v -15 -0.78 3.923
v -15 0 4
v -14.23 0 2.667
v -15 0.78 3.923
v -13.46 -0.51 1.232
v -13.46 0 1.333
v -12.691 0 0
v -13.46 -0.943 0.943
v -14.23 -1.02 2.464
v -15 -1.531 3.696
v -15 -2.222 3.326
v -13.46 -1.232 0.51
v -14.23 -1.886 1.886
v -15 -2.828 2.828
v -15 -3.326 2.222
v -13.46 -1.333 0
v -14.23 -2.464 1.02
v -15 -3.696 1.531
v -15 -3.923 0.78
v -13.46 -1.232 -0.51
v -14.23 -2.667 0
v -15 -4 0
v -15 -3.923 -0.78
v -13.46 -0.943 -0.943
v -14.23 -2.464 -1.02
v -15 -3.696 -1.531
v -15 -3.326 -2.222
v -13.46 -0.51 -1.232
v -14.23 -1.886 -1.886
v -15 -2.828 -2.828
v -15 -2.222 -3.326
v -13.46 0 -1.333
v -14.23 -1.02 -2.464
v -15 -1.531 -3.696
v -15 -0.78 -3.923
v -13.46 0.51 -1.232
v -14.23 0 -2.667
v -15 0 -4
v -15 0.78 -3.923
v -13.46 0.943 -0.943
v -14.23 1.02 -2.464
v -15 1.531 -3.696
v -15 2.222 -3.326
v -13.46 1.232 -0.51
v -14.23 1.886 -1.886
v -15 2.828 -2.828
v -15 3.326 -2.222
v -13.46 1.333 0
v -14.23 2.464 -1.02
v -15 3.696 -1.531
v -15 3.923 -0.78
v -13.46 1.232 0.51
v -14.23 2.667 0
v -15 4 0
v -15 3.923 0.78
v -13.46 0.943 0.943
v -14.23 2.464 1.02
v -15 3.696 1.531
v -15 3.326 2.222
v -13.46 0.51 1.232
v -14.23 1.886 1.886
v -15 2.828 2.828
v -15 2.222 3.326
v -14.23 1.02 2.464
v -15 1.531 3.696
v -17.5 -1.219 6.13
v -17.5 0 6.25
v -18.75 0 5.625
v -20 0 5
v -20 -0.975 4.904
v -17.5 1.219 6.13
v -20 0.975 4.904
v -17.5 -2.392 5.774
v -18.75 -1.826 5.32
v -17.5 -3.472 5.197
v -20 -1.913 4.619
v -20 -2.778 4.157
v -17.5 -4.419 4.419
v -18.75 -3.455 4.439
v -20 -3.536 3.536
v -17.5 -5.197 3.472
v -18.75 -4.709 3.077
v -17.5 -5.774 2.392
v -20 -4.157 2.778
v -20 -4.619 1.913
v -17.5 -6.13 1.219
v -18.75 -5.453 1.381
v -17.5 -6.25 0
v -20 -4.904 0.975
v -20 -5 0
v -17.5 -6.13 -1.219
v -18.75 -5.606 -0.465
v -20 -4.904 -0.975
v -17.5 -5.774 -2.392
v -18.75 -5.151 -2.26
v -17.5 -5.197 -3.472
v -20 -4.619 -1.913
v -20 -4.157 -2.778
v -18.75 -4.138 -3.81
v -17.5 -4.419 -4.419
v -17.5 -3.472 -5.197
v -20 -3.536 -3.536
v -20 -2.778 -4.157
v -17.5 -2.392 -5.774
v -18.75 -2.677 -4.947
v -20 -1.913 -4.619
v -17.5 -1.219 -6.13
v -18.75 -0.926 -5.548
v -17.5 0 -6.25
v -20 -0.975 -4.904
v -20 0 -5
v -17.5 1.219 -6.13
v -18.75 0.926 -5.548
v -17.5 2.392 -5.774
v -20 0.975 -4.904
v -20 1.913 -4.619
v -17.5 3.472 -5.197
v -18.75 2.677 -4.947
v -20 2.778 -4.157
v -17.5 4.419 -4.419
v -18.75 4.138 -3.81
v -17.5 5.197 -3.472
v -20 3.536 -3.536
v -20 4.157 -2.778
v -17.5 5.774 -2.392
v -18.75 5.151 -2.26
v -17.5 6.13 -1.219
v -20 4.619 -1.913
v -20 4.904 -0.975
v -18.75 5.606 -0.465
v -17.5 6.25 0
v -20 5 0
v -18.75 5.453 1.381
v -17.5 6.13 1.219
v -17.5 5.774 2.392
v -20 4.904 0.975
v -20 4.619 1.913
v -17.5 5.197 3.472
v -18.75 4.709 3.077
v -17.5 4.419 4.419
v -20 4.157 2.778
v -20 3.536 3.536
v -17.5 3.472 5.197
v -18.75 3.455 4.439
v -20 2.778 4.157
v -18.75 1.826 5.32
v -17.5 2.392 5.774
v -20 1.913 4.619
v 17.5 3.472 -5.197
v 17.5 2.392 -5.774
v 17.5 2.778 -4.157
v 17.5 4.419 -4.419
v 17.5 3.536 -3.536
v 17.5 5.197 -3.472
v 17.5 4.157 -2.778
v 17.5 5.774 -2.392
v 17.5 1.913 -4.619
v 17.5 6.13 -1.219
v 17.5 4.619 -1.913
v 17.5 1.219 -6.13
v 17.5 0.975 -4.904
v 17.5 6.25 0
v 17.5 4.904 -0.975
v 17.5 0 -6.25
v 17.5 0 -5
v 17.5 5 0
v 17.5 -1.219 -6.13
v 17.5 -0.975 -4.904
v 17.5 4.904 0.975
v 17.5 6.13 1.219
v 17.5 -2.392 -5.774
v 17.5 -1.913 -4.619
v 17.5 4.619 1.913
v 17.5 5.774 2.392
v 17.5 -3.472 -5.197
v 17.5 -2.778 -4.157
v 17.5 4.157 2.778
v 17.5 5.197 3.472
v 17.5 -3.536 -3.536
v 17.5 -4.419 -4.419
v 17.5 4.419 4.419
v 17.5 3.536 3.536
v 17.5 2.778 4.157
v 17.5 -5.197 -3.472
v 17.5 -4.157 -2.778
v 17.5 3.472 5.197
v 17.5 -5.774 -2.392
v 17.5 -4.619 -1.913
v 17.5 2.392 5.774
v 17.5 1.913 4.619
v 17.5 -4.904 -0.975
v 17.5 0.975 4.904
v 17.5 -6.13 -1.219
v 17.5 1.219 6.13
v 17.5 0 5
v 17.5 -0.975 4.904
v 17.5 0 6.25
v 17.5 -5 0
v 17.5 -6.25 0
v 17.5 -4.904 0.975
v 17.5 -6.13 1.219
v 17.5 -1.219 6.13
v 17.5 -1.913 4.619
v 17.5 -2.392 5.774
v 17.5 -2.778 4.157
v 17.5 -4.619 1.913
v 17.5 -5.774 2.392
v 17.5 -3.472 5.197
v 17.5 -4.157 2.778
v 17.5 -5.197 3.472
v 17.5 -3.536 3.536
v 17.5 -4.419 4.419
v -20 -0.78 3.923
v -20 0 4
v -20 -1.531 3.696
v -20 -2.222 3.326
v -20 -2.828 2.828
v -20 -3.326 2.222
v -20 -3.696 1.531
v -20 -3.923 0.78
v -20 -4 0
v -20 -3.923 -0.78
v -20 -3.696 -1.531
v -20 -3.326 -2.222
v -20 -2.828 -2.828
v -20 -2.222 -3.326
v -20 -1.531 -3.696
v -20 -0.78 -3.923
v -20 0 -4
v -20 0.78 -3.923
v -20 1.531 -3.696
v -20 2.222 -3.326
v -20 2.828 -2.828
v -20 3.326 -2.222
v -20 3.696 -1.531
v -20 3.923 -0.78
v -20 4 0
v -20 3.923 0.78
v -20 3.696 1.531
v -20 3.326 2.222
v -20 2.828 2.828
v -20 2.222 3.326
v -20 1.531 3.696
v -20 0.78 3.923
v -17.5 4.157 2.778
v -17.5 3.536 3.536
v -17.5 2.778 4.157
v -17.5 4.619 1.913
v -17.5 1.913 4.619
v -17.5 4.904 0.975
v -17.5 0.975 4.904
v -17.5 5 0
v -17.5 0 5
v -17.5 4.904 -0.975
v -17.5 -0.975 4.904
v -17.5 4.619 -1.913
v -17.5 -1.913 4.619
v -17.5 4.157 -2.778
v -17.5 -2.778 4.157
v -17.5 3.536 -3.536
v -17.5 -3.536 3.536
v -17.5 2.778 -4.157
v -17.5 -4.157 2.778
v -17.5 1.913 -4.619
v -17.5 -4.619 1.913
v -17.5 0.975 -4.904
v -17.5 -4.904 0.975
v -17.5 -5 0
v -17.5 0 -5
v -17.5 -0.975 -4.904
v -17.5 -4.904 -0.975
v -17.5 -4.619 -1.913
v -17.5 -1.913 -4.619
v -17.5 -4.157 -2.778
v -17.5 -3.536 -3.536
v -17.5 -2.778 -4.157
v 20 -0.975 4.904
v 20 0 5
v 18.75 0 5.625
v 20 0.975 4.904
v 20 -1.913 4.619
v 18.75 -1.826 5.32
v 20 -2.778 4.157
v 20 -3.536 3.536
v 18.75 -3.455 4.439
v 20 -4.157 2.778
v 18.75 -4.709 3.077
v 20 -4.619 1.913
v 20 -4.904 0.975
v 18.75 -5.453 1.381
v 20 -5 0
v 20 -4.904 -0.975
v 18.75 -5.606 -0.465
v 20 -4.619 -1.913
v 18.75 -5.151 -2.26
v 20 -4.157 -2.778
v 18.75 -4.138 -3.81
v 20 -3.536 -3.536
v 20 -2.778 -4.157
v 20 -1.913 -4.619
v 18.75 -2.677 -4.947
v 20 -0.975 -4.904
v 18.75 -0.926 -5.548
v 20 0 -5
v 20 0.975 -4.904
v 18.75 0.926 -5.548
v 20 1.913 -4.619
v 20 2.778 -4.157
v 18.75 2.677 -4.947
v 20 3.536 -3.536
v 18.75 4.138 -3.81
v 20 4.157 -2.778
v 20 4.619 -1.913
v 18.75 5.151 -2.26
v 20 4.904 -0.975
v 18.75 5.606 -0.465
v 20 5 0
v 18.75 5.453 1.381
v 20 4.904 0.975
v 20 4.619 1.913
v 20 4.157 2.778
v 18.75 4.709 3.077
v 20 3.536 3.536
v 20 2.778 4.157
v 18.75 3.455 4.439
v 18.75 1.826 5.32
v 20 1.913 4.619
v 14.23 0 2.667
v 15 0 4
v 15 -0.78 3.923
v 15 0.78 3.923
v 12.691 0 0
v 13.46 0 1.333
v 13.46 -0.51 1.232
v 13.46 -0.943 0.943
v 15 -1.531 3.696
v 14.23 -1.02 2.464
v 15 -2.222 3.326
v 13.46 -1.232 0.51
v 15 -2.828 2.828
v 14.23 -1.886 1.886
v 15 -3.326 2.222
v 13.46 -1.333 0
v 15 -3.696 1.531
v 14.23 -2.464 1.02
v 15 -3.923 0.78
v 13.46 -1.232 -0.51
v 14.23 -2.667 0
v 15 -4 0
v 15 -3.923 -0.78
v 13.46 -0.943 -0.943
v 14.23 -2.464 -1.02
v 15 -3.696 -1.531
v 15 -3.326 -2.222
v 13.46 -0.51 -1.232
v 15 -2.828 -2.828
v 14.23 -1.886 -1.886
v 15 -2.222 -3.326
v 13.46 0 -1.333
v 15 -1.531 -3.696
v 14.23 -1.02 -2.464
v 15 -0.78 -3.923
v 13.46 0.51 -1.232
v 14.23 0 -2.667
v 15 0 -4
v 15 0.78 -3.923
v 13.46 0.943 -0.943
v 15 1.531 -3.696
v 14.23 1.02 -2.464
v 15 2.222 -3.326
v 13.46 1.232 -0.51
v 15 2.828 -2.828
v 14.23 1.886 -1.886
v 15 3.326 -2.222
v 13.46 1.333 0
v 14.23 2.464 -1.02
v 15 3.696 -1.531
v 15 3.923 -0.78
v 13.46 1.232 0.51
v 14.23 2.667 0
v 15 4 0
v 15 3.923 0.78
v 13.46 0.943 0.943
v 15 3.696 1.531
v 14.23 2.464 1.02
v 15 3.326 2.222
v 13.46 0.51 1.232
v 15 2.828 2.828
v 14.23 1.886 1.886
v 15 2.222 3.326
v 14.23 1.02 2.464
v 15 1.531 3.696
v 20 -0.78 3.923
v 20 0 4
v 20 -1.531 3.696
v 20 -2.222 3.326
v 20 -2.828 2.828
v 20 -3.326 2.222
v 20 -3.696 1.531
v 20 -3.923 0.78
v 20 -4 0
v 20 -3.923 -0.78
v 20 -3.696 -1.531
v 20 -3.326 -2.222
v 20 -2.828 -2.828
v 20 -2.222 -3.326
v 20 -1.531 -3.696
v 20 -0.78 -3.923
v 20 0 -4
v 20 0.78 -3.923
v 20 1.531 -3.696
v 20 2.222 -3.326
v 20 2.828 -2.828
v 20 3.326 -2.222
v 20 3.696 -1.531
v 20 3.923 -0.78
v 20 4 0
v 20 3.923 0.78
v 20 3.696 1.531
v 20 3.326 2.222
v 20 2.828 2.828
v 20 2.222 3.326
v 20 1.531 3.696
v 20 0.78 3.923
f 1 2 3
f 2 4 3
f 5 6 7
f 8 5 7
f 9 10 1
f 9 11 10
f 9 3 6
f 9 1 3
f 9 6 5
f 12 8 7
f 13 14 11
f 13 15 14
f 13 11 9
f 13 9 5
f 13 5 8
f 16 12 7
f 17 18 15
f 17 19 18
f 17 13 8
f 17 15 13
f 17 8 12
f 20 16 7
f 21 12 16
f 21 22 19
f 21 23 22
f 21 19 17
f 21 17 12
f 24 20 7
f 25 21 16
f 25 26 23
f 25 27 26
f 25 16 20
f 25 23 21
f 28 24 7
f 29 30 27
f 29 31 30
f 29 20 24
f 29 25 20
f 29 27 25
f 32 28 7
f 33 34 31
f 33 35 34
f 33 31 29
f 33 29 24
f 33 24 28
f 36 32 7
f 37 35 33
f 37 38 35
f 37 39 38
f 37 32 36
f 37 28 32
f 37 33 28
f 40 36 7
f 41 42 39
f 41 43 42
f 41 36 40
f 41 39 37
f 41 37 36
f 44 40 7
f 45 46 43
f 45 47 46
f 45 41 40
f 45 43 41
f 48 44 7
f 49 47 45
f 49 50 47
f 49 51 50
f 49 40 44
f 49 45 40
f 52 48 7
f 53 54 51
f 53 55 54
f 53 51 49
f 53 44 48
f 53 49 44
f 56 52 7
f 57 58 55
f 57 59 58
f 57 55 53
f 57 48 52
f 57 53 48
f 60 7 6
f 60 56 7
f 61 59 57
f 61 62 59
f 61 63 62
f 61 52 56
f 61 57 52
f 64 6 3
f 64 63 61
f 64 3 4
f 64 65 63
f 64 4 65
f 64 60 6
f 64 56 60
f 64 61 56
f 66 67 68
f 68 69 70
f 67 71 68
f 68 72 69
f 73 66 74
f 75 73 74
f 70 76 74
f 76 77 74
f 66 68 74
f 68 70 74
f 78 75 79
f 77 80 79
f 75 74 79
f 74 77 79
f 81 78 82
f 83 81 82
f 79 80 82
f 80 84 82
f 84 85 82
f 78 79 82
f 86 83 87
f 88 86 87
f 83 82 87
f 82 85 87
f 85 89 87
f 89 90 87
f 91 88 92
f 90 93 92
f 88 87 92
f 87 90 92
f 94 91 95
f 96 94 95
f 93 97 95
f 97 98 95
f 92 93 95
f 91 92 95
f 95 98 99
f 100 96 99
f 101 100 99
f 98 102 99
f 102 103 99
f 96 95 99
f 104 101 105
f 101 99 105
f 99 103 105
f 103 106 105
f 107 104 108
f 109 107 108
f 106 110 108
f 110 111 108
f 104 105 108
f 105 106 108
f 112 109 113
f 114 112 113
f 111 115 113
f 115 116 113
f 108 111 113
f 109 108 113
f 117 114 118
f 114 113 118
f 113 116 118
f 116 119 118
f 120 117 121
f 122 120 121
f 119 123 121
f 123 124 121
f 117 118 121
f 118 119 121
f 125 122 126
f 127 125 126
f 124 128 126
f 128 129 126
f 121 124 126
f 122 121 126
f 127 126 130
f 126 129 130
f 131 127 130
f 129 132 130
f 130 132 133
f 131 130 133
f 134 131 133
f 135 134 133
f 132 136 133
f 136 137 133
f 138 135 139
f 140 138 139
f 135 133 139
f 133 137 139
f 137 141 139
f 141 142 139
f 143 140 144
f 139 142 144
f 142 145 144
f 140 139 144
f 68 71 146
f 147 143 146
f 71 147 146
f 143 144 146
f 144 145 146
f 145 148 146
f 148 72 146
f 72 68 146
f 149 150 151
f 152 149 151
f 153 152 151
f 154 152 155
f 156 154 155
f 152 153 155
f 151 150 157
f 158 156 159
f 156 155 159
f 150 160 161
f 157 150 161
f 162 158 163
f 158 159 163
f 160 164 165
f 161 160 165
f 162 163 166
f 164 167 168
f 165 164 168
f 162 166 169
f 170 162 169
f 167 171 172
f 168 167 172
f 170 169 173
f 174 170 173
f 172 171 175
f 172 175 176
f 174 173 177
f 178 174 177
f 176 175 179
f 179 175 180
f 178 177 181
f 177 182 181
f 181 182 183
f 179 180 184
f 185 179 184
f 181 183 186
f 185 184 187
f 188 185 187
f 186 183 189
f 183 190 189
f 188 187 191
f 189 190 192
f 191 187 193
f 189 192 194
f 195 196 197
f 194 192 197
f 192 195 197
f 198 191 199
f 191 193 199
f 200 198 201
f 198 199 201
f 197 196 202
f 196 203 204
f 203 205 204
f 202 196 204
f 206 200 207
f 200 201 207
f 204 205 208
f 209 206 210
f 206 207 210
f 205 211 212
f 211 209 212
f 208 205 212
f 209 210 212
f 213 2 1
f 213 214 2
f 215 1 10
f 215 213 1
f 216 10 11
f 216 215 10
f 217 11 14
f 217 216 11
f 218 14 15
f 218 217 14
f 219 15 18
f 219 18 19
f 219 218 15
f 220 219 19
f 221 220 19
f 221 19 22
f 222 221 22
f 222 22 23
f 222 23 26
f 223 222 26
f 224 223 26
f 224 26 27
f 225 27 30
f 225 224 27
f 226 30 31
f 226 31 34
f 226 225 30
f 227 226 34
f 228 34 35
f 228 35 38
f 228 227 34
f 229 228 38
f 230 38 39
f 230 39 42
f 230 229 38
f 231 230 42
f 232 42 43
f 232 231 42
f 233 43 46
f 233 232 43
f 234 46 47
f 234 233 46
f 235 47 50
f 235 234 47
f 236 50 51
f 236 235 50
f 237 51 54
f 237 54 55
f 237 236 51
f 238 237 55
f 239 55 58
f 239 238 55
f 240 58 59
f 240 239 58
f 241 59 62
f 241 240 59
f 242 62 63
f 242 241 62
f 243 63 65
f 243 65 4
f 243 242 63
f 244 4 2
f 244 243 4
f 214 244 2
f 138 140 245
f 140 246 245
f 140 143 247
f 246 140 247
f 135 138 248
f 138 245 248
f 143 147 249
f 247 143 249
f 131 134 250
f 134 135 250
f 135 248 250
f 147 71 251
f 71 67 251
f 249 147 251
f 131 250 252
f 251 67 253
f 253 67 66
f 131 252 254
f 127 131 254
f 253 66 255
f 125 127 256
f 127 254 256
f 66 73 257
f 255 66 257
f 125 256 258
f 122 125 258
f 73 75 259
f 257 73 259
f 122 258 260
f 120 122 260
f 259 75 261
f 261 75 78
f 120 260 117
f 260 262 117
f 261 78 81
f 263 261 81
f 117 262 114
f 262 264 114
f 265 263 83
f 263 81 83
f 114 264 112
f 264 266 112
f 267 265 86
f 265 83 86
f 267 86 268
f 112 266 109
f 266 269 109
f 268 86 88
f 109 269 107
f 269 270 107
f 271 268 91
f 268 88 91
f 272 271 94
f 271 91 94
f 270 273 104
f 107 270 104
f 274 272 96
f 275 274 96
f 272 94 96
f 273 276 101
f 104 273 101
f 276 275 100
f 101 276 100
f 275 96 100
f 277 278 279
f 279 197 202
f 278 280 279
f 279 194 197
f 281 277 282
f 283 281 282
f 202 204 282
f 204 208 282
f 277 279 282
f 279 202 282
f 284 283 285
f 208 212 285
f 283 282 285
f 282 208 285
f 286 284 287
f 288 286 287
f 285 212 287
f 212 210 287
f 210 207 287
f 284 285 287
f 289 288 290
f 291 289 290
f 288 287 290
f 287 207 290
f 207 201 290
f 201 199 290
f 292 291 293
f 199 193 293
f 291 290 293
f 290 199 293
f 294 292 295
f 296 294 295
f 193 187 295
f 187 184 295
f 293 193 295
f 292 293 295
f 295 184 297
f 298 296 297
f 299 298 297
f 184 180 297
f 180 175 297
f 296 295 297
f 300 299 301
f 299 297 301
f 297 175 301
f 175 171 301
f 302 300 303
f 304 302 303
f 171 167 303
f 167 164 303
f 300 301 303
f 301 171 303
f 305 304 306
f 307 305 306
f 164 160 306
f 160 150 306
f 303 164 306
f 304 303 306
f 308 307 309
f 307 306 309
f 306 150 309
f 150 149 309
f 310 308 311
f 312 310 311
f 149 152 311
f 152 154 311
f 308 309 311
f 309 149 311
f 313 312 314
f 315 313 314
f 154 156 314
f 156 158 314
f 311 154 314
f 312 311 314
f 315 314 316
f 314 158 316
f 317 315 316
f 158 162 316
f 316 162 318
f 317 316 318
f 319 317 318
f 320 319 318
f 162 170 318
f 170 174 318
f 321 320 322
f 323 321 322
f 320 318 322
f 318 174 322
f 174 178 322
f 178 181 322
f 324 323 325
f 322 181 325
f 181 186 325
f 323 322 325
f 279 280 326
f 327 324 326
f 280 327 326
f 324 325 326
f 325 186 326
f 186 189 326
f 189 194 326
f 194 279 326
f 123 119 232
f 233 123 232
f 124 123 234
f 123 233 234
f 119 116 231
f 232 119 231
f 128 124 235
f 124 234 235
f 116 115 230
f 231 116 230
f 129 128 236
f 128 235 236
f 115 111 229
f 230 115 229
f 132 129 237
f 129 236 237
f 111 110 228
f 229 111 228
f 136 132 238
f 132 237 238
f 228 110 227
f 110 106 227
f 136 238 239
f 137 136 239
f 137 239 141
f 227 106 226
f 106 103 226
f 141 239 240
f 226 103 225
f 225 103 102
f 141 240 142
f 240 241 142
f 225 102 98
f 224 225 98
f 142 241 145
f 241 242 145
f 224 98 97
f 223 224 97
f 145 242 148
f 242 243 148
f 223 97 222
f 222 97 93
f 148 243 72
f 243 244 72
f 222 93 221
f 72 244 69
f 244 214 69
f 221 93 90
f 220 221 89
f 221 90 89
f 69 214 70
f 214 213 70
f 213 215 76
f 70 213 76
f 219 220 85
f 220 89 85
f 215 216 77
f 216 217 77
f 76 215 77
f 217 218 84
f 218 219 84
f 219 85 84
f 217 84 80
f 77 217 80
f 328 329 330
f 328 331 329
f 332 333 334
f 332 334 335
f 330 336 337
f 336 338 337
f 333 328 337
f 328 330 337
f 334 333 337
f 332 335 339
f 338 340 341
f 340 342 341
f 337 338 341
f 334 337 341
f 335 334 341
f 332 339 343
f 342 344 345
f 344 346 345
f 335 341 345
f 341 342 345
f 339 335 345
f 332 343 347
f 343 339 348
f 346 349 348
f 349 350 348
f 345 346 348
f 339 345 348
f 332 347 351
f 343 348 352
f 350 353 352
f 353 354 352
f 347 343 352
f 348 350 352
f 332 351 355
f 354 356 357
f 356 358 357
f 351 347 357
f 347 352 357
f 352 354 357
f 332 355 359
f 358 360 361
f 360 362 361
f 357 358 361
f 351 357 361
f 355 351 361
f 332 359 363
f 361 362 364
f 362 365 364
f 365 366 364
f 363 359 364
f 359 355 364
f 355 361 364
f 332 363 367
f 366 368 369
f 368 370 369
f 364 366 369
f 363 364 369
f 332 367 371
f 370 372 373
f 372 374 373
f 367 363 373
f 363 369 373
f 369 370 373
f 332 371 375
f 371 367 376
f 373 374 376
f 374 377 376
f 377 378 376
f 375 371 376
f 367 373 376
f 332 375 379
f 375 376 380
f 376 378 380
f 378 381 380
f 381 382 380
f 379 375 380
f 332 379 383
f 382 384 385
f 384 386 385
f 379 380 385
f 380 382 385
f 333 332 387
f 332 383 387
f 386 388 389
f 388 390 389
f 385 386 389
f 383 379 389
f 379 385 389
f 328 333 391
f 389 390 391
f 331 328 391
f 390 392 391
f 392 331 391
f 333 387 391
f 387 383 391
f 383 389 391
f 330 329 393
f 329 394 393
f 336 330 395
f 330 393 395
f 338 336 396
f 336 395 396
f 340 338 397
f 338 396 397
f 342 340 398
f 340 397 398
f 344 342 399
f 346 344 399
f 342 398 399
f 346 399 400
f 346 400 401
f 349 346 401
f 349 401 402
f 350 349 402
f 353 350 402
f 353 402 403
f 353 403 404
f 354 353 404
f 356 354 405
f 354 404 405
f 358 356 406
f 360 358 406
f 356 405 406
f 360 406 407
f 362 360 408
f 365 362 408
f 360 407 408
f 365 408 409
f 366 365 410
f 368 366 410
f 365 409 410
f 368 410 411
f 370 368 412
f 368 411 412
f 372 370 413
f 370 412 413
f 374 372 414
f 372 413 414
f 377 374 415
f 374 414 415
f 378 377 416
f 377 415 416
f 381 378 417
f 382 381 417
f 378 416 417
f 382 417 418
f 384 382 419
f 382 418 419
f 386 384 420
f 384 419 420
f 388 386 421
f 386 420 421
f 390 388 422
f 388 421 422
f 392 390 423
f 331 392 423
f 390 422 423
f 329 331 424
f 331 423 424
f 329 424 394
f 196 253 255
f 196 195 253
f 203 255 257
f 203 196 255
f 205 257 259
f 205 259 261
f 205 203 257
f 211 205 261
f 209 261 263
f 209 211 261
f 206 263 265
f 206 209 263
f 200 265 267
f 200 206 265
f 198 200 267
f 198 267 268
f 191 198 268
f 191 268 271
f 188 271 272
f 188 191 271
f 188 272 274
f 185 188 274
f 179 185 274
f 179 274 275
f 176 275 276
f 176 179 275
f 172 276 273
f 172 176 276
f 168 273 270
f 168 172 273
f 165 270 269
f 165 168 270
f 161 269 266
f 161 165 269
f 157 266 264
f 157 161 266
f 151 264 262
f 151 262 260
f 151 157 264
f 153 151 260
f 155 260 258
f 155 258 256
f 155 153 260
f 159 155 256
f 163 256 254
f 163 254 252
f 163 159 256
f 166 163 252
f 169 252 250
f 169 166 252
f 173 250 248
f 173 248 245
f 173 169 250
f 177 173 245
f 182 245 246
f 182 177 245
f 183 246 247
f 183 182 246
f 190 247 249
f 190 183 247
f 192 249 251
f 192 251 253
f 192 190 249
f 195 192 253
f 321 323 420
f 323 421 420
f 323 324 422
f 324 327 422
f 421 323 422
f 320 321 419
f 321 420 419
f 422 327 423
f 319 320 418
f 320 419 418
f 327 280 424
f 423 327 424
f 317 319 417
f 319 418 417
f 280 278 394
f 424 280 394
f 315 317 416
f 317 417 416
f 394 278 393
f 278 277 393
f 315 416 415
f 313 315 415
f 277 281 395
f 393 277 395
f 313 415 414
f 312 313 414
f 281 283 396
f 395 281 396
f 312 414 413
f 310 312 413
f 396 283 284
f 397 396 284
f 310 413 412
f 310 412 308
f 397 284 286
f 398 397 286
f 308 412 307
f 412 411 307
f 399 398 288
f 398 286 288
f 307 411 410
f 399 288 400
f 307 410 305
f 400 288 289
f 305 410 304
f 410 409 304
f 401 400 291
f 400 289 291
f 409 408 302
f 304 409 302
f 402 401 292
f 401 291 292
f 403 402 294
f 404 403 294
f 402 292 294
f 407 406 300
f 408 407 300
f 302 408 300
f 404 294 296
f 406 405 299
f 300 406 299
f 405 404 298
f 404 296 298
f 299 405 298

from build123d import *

# Parameters (mm, degrees)
SKETCH1_W = 40
SKETCH1_H = 5
SKETCH2_W = 3.5
SKETCH2_H = 6


with BuildPart() as part:
    # Sketch1 → Base-Revolve (revolve)
    with BuildSketch(Plane.XY, mode=Mode.PRIVATE) as base_revolve_sk:
        with Locations((0, 2.5)):
            Rectangle(SKETCH1_W, SKETCH1_H)
    revolve(base_revolve_sk.sketch.rotate(Axis((-30, 0, 0), (1, 0, 0)), 90), axis=Axis((-30, 0, 0), (1, 0, 0)))

    # Sketch2 → Cut-to-GripLength (revolve, cut)
    with BuildSketch(Plane.XY):
        with Locations((-19.25, 3)):
            Rectangle(SKETCH2_W, SKETCH2_H)
        with Locations((19.25, 3)):
            Rectangle(SKETCH2_W, SKETCH2_H)
    revolve(axis=Axis((-30, 0, 0), (1, 0, 0)), mode=Mode.SUBTRACT)

    # Sketch3 → HeadTypeA (revolve)
    with BuildSketch(Plane.XY, mode=Mode.PRIVATE) as headtypea_sk:
        Polygon((-20, 5), (-20, 0), (-17.5, 0), (-17.5, 6.25), align=None)
        Polygon((20, 5), (17.5, 6.25), (17.5, 0), (20, 0), align=None)
    revolve(headtypea_sk.sketch.rotate(Axis((-23, 0, 0), (1, 0, 0)), 90), axis=Axis((-23, 0, 0), (1, 0, 0)))

    # Sketch5 → HoleTypeA (revolve, cut)
    with BuildSketch(Plane.XY, mode=Mode.PRIVATE) as holetypea_sk:
        Polygon((-12.690598923, 0), (-15, 4), (-20, 4), (-20, 0), align=None)
        Polygon((12.690598923, 0), (15, 4), (20, 4), (20, 0), align=None)
    revolve(holetypea_sk.sketch.rotate(Axis((-22, 0, 0), (1, 0, 0)), 90), axis=Axis((-22, 0, 0), (1, 0, 0)), mode=Mode.SUBTRACT)


solid = part.part
